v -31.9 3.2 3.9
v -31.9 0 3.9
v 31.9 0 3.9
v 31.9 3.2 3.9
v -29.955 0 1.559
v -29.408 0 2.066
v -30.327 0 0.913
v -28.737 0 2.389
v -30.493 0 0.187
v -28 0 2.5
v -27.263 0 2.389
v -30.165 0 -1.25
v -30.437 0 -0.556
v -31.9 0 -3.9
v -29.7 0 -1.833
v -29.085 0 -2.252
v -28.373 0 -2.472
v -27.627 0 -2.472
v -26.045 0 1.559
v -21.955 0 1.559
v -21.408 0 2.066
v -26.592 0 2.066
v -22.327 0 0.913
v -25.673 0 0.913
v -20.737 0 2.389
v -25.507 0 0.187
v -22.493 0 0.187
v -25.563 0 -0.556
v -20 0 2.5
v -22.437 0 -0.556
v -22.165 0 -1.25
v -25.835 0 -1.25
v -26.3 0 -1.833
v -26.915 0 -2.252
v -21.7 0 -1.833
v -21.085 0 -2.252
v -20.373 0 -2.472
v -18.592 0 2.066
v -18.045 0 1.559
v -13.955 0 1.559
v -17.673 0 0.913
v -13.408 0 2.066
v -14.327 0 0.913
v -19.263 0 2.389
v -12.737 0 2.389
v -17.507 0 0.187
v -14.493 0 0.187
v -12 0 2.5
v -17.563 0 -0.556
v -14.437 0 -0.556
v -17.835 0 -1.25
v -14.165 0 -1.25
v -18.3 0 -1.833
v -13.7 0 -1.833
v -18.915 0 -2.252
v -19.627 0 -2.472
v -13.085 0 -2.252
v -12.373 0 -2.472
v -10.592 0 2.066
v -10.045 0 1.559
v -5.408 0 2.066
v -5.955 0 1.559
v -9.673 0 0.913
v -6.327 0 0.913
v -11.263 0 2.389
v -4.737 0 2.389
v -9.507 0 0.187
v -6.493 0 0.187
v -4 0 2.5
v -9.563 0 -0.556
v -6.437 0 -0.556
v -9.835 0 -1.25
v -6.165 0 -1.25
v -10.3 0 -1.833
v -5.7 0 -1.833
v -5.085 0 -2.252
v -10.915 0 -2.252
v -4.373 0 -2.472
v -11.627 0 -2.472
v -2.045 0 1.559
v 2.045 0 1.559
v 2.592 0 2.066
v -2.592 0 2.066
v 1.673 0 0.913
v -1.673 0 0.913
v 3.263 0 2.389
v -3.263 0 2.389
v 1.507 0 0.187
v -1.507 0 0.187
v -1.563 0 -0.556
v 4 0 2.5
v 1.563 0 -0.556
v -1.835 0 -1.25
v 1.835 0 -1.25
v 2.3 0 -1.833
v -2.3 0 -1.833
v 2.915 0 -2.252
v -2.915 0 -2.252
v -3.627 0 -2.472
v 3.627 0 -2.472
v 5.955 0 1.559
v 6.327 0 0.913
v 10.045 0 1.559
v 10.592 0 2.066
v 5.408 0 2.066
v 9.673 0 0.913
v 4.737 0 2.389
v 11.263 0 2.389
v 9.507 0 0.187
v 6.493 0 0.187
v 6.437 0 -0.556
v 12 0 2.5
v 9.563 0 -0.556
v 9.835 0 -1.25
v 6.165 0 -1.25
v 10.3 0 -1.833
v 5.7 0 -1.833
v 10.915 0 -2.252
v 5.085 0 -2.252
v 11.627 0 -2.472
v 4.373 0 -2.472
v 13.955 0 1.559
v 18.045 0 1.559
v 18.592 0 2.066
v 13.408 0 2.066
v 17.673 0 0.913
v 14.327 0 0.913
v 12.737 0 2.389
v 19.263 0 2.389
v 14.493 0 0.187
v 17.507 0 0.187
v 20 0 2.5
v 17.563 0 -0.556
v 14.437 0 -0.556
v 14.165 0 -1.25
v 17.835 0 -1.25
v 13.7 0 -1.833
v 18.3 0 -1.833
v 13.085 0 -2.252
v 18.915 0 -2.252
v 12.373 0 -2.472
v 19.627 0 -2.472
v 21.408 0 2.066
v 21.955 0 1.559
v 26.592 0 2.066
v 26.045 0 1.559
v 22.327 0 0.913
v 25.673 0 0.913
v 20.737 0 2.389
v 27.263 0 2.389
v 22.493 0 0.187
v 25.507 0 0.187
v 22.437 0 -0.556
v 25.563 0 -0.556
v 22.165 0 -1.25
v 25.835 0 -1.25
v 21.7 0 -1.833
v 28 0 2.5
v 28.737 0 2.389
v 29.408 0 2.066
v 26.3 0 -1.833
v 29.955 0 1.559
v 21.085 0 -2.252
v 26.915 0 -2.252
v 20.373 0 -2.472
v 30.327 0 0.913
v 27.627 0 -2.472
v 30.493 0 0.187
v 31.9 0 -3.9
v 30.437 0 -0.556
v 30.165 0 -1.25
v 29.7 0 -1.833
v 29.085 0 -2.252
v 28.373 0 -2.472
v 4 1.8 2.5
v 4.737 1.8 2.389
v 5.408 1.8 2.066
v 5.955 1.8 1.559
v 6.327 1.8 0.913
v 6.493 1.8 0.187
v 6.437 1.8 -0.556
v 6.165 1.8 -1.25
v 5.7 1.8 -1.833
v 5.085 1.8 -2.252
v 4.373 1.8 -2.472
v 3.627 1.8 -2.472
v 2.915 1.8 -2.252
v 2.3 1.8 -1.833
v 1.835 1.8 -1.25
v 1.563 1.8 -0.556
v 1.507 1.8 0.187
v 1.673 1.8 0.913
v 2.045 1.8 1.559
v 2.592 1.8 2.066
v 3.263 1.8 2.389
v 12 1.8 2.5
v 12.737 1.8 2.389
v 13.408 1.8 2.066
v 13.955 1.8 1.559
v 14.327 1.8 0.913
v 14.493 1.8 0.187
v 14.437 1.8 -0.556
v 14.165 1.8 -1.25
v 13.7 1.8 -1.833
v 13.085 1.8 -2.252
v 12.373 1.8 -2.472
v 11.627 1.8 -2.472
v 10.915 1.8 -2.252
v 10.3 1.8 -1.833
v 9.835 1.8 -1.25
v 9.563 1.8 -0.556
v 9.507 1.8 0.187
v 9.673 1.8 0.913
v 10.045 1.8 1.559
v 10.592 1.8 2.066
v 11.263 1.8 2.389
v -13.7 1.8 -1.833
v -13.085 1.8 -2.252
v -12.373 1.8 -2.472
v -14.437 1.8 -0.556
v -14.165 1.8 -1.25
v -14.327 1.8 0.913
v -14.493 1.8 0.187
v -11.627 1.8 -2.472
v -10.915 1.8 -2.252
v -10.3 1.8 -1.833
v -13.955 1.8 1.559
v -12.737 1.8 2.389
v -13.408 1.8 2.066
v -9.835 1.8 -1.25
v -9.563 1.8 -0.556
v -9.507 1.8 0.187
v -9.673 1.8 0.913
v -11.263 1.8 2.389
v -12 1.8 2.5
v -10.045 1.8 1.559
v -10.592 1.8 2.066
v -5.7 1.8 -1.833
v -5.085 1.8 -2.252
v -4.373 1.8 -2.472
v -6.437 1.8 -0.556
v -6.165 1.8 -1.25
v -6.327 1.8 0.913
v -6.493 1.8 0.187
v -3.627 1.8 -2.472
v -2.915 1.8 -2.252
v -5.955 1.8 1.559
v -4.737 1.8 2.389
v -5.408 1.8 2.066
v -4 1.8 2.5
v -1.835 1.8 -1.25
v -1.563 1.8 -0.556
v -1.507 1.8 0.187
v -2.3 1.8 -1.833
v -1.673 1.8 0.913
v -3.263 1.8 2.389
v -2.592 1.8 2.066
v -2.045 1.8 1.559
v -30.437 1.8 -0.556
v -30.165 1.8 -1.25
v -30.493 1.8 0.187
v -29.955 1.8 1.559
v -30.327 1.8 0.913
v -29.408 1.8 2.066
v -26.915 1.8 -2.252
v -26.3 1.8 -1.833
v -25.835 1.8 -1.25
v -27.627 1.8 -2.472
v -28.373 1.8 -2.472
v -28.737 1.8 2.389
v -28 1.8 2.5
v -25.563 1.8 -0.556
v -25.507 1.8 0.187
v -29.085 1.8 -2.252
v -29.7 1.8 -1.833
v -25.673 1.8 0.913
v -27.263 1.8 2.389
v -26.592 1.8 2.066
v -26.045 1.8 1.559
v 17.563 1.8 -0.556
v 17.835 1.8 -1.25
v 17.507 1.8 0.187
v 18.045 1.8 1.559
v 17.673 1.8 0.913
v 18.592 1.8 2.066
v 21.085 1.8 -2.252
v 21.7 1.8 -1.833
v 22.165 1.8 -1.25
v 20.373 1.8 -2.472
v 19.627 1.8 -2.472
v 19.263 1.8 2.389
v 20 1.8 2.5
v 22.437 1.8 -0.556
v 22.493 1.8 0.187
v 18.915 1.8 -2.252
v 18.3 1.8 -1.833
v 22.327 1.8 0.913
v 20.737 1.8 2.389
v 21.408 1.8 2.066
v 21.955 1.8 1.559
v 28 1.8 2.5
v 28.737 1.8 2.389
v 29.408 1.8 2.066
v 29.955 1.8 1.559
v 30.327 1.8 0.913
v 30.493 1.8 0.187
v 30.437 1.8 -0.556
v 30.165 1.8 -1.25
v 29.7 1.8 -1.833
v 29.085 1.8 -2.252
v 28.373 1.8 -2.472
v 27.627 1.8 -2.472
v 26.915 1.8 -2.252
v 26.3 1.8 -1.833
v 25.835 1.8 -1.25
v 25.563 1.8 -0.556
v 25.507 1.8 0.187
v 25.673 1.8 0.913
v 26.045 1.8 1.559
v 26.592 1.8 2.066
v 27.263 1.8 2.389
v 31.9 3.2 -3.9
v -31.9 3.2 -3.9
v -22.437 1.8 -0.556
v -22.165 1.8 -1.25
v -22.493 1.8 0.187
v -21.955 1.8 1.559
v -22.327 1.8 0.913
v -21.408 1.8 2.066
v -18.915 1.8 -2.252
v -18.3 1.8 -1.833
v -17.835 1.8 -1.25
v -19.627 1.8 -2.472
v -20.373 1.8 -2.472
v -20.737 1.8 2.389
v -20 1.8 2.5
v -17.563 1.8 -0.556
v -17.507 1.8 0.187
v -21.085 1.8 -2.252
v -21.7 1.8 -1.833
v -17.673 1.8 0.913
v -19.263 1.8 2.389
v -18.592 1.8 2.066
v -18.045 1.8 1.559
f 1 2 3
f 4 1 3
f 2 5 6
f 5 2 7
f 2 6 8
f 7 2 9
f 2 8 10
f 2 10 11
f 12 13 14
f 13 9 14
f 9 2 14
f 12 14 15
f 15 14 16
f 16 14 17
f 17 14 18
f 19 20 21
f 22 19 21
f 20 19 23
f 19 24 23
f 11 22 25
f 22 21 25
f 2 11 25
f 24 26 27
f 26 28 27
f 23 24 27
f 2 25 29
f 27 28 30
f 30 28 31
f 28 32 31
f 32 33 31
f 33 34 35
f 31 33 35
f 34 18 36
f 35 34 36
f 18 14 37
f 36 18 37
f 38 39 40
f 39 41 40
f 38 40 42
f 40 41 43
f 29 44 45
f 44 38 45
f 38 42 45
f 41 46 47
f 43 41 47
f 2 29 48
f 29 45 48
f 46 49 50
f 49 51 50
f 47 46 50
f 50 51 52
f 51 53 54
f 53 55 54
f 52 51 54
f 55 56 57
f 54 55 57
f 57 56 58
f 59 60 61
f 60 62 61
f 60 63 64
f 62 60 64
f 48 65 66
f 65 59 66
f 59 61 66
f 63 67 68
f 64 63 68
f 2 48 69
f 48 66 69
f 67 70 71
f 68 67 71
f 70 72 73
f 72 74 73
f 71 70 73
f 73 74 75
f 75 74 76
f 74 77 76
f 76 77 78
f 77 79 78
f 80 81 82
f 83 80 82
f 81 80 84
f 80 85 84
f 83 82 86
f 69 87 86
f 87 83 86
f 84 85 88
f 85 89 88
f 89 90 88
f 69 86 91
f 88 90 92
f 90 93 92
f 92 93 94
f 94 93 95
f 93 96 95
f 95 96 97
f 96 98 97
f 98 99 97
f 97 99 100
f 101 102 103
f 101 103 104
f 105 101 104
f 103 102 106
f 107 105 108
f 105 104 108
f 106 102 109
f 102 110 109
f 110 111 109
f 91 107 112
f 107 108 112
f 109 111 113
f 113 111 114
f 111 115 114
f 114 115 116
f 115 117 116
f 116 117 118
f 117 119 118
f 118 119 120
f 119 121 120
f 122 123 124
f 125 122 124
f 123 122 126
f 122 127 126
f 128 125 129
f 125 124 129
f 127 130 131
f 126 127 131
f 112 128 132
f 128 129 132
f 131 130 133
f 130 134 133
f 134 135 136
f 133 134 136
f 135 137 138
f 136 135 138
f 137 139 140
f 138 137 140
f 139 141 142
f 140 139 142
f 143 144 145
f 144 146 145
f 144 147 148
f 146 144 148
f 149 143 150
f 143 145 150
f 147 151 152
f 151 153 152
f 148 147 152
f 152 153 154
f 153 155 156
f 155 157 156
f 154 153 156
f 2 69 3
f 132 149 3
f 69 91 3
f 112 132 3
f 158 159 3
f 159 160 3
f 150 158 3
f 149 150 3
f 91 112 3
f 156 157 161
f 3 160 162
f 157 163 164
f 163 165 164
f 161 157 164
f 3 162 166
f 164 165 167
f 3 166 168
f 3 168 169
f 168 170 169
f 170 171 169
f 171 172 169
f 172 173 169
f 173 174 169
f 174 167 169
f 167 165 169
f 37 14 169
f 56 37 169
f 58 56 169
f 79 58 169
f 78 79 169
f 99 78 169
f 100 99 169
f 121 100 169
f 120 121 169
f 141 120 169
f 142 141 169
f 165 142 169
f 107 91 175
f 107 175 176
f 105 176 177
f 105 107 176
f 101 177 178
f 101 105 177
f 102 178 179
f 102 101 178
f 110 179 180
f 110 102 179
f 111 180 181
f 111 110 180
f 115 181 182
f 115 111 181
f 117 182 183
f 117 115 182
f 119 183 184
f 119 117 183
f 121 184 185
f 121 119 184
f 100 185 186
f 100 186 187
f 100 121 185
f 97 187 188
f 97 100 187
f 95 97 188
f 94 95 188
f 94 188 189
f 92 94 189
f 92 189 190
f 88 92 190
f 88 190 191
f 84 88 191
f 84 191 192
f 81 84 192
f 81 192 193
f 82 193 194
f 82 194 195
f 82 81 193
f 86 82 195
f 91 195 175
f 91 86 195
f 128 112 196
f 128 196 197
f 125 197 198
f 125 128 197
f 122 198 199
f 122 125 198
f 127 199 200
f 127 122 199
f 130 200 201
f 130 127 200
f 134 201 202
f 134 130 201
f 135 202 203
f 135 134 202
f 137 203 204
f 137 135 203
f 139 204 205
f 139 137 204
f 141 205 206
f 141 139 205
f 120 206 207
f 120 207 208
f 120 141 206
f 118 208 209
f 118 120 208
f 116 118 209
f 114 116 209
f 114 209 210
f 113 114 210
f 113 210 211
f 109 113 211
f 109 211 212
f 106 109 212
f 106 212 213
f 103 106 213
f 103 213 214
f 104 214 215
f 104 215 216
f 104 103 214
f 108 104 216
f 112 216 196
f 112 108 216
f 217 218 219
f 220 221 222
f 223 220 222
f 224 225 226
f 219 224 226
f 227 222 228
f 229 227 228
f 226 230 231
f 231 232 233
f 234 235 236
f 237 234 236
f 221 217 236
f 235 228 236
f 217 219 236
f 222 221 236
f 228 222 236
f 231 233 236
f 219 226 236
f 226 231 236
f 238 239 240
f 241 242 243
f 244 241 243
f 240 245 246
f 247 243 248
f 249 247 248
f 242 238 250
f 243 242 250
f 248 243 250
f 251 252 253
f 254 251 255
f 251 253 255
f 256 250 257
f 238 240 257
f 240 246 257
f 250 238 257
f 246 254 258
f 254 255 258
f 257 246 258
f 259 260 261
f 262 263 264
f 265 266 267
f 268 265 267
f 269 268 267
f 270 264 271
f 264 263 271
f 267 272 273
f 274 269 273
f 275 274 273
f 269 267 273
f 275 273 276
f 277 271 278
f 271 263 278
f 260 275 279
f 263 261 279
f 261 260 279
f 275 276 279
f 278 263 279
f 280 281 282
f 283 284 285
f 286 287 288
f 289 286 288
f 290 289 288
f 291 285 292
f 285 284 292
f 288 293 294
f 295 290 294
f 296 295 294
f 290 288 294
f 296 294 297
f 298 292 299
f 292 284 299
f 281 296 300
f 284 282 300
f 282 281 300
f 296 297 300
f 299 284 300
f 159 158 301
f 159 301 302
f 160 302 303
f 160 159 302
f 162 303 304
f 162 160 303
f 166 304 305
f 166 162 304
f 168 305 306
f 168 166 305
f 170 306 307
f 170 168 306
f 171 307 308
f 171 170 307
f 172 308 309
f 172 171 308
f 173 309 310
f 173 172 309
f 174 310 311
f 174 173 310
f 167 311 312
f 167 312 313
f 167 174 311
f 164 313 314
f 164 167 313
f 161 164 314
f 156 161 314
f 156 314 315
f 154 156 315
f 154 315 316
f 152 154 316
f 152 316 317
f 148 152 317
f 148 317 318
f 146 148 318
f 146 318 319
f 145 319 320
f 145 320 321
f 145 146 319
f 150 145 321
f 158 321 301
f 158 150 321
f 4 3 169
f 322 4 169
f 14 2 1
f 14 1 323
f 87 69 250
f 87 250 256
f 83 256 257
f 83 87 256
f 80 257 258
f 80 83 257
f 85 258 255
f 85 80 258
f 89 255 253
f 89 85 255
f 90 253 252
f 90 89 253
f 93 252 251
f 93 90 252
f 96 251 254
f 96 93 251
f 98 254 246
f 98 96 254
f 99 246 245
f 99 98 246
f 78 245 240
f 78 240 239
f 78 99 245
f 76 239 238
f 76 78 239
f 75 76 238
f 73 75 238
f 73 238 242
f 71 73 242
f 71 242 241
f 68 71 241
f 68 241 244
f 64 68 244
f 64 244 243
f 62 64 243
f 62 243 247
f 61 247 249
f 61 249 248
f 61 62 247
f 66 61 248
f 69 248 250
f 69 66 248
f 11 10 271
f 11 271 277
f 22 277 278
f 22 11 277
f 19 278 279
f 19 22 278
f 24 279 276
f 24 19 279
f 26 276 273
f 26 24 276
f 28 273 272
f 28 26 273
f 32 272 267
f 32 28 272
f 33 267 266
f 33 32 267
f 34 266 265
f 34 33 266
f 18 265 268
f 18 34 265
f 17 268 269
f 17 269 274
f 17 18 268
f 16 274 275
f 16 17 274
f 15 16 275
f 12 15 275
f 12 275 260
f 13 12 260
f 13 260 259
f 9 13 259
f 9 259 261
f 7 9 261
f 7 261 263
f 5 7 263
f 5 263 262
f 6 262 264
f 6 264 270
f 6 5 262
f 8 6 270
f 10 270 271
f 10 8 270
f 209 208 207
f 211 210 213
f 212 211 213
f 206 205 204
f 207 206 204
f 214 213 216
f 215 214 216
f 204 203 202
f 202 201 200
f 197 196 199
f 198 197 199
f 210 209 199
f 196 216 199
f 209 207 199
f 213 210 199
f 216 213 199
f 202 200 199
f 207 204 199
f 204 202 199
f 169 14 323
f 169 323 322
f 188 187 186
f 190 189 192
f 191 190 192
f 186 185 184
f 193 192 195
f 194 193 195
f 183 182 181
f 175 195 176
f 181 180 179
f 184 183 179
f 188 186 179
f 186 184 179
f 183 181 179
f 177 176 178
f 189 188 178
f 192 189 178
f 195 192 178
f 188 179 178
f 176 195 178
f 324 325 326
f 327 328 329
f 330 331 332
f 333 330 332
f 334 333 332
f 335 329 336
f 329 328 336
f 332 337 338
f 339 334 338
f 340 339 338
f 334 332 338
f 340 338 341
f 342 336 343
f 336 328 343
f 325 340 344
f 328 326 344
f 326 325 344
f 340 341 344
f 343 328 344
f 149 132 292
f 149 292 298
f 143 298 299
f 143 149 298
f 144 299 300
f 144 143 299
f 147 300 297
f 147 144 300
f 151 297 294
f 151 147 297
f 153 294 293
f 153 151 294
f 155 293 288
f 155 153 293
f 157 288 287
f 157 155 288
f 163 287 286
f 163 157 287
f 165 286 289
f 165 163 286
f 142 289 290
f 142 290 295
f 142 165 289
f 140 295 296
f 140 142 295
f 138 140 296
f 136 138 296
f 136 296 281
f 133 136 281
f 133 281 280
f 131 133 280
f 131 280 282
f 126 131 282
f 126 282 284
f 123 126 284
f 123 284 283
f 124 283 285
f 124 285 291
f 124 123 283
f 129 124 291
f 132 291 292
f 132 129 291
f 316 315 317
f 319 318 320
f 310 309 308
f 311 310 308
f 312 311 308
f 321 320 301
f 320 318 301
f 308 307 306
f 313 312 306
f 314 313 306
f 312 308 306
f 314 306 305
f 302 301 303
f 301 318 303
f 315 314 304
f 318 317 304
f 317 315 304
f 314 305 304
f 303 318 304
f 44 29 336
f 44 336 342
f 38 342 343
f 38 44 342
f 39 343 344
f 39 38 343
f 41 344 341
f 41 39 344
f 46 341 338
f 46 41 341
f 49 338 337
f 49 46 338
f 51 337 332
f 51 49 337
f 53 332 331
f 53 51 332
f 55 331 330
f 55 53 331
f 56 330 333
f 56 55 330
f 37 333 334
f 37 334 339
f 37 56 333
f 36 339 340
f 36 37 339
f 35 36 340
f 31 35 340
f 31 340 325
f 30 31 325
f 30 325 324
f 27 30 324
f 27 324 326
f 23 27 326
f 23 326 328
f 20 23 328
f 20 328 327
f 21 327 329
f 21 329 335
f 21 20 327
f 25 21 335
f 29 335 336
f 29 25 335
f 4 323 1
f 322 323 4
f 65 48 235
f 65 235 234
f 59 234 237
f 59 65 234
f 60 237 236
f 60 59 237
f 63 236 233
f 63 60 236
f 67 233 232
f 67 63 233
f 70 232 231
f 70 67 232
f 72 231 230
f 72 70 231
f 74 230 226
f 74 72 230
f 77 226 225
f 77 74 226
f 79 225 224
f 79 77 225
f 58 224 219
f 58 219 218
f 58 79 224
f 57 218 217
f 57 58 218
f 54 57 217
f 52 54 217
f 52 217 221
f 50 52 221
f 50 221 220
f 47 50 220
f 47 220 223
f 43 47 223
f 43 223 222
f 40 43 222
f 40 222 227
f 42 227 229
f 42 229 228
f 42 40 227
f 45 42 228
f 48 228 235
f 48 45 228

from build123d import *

# Parameters (mm, degrees)
SKETCH_1_W          = 63.8
SKETCH_1_H          = 7.8
EXTRUDE_2_DEPTH     = 3.2
SKETCH_1_7_R        = 2.5
CUT_EXTRUDE_4_DEPTH = 1.8


with BuildPart() as part:
    # Эскиз1 → Бобышка-Вытянуть2 (new body)
    with BuildSketch(Plane(origin=(0, 0, 0), x_dir=(1, 0, 0), z_dir=(0, 1, 0))):
        Rectangle(SKETCH_1_W, SKETCH_1_H)
    extrude(amount=EXTRUDE_2_DEPTH)

    # Эскиз1<7> → Вырез-Вытянуть4 (cut)
    with BuildSketch(Plane(origin=(0, 0, 0), x_dir=(1, 0, 0), z_dir=(0, 1, 0))):
        with Locations((-28, 0)):
            Circle(SKETCH_1_7_R)
        with Locations((-20, 0)):
            Circle(SKETCH_1_7_R)
        with Locations((-12, 0)):
            Circle(SKETCH_1_7_R)
        with Locations((-4, 0)):
            Circle(SKETCH_1_7_R)
        with Locations((4, 0)):
            Circle(SKETCH_1_7_R)
        with Locations((12, 0)):
            Circle(SKETCH_1_7_R)
        with Locations((20, 0)):
            Circle(SKETCH_1_7_R)
        with Locations((28, 0)):
            Circle(SKETCH_1_7_R)
    extrude(amount=CUT_EXTRUDE_4_DEPTH, mode=Mode.SUBTRACT)


solid = part.part
